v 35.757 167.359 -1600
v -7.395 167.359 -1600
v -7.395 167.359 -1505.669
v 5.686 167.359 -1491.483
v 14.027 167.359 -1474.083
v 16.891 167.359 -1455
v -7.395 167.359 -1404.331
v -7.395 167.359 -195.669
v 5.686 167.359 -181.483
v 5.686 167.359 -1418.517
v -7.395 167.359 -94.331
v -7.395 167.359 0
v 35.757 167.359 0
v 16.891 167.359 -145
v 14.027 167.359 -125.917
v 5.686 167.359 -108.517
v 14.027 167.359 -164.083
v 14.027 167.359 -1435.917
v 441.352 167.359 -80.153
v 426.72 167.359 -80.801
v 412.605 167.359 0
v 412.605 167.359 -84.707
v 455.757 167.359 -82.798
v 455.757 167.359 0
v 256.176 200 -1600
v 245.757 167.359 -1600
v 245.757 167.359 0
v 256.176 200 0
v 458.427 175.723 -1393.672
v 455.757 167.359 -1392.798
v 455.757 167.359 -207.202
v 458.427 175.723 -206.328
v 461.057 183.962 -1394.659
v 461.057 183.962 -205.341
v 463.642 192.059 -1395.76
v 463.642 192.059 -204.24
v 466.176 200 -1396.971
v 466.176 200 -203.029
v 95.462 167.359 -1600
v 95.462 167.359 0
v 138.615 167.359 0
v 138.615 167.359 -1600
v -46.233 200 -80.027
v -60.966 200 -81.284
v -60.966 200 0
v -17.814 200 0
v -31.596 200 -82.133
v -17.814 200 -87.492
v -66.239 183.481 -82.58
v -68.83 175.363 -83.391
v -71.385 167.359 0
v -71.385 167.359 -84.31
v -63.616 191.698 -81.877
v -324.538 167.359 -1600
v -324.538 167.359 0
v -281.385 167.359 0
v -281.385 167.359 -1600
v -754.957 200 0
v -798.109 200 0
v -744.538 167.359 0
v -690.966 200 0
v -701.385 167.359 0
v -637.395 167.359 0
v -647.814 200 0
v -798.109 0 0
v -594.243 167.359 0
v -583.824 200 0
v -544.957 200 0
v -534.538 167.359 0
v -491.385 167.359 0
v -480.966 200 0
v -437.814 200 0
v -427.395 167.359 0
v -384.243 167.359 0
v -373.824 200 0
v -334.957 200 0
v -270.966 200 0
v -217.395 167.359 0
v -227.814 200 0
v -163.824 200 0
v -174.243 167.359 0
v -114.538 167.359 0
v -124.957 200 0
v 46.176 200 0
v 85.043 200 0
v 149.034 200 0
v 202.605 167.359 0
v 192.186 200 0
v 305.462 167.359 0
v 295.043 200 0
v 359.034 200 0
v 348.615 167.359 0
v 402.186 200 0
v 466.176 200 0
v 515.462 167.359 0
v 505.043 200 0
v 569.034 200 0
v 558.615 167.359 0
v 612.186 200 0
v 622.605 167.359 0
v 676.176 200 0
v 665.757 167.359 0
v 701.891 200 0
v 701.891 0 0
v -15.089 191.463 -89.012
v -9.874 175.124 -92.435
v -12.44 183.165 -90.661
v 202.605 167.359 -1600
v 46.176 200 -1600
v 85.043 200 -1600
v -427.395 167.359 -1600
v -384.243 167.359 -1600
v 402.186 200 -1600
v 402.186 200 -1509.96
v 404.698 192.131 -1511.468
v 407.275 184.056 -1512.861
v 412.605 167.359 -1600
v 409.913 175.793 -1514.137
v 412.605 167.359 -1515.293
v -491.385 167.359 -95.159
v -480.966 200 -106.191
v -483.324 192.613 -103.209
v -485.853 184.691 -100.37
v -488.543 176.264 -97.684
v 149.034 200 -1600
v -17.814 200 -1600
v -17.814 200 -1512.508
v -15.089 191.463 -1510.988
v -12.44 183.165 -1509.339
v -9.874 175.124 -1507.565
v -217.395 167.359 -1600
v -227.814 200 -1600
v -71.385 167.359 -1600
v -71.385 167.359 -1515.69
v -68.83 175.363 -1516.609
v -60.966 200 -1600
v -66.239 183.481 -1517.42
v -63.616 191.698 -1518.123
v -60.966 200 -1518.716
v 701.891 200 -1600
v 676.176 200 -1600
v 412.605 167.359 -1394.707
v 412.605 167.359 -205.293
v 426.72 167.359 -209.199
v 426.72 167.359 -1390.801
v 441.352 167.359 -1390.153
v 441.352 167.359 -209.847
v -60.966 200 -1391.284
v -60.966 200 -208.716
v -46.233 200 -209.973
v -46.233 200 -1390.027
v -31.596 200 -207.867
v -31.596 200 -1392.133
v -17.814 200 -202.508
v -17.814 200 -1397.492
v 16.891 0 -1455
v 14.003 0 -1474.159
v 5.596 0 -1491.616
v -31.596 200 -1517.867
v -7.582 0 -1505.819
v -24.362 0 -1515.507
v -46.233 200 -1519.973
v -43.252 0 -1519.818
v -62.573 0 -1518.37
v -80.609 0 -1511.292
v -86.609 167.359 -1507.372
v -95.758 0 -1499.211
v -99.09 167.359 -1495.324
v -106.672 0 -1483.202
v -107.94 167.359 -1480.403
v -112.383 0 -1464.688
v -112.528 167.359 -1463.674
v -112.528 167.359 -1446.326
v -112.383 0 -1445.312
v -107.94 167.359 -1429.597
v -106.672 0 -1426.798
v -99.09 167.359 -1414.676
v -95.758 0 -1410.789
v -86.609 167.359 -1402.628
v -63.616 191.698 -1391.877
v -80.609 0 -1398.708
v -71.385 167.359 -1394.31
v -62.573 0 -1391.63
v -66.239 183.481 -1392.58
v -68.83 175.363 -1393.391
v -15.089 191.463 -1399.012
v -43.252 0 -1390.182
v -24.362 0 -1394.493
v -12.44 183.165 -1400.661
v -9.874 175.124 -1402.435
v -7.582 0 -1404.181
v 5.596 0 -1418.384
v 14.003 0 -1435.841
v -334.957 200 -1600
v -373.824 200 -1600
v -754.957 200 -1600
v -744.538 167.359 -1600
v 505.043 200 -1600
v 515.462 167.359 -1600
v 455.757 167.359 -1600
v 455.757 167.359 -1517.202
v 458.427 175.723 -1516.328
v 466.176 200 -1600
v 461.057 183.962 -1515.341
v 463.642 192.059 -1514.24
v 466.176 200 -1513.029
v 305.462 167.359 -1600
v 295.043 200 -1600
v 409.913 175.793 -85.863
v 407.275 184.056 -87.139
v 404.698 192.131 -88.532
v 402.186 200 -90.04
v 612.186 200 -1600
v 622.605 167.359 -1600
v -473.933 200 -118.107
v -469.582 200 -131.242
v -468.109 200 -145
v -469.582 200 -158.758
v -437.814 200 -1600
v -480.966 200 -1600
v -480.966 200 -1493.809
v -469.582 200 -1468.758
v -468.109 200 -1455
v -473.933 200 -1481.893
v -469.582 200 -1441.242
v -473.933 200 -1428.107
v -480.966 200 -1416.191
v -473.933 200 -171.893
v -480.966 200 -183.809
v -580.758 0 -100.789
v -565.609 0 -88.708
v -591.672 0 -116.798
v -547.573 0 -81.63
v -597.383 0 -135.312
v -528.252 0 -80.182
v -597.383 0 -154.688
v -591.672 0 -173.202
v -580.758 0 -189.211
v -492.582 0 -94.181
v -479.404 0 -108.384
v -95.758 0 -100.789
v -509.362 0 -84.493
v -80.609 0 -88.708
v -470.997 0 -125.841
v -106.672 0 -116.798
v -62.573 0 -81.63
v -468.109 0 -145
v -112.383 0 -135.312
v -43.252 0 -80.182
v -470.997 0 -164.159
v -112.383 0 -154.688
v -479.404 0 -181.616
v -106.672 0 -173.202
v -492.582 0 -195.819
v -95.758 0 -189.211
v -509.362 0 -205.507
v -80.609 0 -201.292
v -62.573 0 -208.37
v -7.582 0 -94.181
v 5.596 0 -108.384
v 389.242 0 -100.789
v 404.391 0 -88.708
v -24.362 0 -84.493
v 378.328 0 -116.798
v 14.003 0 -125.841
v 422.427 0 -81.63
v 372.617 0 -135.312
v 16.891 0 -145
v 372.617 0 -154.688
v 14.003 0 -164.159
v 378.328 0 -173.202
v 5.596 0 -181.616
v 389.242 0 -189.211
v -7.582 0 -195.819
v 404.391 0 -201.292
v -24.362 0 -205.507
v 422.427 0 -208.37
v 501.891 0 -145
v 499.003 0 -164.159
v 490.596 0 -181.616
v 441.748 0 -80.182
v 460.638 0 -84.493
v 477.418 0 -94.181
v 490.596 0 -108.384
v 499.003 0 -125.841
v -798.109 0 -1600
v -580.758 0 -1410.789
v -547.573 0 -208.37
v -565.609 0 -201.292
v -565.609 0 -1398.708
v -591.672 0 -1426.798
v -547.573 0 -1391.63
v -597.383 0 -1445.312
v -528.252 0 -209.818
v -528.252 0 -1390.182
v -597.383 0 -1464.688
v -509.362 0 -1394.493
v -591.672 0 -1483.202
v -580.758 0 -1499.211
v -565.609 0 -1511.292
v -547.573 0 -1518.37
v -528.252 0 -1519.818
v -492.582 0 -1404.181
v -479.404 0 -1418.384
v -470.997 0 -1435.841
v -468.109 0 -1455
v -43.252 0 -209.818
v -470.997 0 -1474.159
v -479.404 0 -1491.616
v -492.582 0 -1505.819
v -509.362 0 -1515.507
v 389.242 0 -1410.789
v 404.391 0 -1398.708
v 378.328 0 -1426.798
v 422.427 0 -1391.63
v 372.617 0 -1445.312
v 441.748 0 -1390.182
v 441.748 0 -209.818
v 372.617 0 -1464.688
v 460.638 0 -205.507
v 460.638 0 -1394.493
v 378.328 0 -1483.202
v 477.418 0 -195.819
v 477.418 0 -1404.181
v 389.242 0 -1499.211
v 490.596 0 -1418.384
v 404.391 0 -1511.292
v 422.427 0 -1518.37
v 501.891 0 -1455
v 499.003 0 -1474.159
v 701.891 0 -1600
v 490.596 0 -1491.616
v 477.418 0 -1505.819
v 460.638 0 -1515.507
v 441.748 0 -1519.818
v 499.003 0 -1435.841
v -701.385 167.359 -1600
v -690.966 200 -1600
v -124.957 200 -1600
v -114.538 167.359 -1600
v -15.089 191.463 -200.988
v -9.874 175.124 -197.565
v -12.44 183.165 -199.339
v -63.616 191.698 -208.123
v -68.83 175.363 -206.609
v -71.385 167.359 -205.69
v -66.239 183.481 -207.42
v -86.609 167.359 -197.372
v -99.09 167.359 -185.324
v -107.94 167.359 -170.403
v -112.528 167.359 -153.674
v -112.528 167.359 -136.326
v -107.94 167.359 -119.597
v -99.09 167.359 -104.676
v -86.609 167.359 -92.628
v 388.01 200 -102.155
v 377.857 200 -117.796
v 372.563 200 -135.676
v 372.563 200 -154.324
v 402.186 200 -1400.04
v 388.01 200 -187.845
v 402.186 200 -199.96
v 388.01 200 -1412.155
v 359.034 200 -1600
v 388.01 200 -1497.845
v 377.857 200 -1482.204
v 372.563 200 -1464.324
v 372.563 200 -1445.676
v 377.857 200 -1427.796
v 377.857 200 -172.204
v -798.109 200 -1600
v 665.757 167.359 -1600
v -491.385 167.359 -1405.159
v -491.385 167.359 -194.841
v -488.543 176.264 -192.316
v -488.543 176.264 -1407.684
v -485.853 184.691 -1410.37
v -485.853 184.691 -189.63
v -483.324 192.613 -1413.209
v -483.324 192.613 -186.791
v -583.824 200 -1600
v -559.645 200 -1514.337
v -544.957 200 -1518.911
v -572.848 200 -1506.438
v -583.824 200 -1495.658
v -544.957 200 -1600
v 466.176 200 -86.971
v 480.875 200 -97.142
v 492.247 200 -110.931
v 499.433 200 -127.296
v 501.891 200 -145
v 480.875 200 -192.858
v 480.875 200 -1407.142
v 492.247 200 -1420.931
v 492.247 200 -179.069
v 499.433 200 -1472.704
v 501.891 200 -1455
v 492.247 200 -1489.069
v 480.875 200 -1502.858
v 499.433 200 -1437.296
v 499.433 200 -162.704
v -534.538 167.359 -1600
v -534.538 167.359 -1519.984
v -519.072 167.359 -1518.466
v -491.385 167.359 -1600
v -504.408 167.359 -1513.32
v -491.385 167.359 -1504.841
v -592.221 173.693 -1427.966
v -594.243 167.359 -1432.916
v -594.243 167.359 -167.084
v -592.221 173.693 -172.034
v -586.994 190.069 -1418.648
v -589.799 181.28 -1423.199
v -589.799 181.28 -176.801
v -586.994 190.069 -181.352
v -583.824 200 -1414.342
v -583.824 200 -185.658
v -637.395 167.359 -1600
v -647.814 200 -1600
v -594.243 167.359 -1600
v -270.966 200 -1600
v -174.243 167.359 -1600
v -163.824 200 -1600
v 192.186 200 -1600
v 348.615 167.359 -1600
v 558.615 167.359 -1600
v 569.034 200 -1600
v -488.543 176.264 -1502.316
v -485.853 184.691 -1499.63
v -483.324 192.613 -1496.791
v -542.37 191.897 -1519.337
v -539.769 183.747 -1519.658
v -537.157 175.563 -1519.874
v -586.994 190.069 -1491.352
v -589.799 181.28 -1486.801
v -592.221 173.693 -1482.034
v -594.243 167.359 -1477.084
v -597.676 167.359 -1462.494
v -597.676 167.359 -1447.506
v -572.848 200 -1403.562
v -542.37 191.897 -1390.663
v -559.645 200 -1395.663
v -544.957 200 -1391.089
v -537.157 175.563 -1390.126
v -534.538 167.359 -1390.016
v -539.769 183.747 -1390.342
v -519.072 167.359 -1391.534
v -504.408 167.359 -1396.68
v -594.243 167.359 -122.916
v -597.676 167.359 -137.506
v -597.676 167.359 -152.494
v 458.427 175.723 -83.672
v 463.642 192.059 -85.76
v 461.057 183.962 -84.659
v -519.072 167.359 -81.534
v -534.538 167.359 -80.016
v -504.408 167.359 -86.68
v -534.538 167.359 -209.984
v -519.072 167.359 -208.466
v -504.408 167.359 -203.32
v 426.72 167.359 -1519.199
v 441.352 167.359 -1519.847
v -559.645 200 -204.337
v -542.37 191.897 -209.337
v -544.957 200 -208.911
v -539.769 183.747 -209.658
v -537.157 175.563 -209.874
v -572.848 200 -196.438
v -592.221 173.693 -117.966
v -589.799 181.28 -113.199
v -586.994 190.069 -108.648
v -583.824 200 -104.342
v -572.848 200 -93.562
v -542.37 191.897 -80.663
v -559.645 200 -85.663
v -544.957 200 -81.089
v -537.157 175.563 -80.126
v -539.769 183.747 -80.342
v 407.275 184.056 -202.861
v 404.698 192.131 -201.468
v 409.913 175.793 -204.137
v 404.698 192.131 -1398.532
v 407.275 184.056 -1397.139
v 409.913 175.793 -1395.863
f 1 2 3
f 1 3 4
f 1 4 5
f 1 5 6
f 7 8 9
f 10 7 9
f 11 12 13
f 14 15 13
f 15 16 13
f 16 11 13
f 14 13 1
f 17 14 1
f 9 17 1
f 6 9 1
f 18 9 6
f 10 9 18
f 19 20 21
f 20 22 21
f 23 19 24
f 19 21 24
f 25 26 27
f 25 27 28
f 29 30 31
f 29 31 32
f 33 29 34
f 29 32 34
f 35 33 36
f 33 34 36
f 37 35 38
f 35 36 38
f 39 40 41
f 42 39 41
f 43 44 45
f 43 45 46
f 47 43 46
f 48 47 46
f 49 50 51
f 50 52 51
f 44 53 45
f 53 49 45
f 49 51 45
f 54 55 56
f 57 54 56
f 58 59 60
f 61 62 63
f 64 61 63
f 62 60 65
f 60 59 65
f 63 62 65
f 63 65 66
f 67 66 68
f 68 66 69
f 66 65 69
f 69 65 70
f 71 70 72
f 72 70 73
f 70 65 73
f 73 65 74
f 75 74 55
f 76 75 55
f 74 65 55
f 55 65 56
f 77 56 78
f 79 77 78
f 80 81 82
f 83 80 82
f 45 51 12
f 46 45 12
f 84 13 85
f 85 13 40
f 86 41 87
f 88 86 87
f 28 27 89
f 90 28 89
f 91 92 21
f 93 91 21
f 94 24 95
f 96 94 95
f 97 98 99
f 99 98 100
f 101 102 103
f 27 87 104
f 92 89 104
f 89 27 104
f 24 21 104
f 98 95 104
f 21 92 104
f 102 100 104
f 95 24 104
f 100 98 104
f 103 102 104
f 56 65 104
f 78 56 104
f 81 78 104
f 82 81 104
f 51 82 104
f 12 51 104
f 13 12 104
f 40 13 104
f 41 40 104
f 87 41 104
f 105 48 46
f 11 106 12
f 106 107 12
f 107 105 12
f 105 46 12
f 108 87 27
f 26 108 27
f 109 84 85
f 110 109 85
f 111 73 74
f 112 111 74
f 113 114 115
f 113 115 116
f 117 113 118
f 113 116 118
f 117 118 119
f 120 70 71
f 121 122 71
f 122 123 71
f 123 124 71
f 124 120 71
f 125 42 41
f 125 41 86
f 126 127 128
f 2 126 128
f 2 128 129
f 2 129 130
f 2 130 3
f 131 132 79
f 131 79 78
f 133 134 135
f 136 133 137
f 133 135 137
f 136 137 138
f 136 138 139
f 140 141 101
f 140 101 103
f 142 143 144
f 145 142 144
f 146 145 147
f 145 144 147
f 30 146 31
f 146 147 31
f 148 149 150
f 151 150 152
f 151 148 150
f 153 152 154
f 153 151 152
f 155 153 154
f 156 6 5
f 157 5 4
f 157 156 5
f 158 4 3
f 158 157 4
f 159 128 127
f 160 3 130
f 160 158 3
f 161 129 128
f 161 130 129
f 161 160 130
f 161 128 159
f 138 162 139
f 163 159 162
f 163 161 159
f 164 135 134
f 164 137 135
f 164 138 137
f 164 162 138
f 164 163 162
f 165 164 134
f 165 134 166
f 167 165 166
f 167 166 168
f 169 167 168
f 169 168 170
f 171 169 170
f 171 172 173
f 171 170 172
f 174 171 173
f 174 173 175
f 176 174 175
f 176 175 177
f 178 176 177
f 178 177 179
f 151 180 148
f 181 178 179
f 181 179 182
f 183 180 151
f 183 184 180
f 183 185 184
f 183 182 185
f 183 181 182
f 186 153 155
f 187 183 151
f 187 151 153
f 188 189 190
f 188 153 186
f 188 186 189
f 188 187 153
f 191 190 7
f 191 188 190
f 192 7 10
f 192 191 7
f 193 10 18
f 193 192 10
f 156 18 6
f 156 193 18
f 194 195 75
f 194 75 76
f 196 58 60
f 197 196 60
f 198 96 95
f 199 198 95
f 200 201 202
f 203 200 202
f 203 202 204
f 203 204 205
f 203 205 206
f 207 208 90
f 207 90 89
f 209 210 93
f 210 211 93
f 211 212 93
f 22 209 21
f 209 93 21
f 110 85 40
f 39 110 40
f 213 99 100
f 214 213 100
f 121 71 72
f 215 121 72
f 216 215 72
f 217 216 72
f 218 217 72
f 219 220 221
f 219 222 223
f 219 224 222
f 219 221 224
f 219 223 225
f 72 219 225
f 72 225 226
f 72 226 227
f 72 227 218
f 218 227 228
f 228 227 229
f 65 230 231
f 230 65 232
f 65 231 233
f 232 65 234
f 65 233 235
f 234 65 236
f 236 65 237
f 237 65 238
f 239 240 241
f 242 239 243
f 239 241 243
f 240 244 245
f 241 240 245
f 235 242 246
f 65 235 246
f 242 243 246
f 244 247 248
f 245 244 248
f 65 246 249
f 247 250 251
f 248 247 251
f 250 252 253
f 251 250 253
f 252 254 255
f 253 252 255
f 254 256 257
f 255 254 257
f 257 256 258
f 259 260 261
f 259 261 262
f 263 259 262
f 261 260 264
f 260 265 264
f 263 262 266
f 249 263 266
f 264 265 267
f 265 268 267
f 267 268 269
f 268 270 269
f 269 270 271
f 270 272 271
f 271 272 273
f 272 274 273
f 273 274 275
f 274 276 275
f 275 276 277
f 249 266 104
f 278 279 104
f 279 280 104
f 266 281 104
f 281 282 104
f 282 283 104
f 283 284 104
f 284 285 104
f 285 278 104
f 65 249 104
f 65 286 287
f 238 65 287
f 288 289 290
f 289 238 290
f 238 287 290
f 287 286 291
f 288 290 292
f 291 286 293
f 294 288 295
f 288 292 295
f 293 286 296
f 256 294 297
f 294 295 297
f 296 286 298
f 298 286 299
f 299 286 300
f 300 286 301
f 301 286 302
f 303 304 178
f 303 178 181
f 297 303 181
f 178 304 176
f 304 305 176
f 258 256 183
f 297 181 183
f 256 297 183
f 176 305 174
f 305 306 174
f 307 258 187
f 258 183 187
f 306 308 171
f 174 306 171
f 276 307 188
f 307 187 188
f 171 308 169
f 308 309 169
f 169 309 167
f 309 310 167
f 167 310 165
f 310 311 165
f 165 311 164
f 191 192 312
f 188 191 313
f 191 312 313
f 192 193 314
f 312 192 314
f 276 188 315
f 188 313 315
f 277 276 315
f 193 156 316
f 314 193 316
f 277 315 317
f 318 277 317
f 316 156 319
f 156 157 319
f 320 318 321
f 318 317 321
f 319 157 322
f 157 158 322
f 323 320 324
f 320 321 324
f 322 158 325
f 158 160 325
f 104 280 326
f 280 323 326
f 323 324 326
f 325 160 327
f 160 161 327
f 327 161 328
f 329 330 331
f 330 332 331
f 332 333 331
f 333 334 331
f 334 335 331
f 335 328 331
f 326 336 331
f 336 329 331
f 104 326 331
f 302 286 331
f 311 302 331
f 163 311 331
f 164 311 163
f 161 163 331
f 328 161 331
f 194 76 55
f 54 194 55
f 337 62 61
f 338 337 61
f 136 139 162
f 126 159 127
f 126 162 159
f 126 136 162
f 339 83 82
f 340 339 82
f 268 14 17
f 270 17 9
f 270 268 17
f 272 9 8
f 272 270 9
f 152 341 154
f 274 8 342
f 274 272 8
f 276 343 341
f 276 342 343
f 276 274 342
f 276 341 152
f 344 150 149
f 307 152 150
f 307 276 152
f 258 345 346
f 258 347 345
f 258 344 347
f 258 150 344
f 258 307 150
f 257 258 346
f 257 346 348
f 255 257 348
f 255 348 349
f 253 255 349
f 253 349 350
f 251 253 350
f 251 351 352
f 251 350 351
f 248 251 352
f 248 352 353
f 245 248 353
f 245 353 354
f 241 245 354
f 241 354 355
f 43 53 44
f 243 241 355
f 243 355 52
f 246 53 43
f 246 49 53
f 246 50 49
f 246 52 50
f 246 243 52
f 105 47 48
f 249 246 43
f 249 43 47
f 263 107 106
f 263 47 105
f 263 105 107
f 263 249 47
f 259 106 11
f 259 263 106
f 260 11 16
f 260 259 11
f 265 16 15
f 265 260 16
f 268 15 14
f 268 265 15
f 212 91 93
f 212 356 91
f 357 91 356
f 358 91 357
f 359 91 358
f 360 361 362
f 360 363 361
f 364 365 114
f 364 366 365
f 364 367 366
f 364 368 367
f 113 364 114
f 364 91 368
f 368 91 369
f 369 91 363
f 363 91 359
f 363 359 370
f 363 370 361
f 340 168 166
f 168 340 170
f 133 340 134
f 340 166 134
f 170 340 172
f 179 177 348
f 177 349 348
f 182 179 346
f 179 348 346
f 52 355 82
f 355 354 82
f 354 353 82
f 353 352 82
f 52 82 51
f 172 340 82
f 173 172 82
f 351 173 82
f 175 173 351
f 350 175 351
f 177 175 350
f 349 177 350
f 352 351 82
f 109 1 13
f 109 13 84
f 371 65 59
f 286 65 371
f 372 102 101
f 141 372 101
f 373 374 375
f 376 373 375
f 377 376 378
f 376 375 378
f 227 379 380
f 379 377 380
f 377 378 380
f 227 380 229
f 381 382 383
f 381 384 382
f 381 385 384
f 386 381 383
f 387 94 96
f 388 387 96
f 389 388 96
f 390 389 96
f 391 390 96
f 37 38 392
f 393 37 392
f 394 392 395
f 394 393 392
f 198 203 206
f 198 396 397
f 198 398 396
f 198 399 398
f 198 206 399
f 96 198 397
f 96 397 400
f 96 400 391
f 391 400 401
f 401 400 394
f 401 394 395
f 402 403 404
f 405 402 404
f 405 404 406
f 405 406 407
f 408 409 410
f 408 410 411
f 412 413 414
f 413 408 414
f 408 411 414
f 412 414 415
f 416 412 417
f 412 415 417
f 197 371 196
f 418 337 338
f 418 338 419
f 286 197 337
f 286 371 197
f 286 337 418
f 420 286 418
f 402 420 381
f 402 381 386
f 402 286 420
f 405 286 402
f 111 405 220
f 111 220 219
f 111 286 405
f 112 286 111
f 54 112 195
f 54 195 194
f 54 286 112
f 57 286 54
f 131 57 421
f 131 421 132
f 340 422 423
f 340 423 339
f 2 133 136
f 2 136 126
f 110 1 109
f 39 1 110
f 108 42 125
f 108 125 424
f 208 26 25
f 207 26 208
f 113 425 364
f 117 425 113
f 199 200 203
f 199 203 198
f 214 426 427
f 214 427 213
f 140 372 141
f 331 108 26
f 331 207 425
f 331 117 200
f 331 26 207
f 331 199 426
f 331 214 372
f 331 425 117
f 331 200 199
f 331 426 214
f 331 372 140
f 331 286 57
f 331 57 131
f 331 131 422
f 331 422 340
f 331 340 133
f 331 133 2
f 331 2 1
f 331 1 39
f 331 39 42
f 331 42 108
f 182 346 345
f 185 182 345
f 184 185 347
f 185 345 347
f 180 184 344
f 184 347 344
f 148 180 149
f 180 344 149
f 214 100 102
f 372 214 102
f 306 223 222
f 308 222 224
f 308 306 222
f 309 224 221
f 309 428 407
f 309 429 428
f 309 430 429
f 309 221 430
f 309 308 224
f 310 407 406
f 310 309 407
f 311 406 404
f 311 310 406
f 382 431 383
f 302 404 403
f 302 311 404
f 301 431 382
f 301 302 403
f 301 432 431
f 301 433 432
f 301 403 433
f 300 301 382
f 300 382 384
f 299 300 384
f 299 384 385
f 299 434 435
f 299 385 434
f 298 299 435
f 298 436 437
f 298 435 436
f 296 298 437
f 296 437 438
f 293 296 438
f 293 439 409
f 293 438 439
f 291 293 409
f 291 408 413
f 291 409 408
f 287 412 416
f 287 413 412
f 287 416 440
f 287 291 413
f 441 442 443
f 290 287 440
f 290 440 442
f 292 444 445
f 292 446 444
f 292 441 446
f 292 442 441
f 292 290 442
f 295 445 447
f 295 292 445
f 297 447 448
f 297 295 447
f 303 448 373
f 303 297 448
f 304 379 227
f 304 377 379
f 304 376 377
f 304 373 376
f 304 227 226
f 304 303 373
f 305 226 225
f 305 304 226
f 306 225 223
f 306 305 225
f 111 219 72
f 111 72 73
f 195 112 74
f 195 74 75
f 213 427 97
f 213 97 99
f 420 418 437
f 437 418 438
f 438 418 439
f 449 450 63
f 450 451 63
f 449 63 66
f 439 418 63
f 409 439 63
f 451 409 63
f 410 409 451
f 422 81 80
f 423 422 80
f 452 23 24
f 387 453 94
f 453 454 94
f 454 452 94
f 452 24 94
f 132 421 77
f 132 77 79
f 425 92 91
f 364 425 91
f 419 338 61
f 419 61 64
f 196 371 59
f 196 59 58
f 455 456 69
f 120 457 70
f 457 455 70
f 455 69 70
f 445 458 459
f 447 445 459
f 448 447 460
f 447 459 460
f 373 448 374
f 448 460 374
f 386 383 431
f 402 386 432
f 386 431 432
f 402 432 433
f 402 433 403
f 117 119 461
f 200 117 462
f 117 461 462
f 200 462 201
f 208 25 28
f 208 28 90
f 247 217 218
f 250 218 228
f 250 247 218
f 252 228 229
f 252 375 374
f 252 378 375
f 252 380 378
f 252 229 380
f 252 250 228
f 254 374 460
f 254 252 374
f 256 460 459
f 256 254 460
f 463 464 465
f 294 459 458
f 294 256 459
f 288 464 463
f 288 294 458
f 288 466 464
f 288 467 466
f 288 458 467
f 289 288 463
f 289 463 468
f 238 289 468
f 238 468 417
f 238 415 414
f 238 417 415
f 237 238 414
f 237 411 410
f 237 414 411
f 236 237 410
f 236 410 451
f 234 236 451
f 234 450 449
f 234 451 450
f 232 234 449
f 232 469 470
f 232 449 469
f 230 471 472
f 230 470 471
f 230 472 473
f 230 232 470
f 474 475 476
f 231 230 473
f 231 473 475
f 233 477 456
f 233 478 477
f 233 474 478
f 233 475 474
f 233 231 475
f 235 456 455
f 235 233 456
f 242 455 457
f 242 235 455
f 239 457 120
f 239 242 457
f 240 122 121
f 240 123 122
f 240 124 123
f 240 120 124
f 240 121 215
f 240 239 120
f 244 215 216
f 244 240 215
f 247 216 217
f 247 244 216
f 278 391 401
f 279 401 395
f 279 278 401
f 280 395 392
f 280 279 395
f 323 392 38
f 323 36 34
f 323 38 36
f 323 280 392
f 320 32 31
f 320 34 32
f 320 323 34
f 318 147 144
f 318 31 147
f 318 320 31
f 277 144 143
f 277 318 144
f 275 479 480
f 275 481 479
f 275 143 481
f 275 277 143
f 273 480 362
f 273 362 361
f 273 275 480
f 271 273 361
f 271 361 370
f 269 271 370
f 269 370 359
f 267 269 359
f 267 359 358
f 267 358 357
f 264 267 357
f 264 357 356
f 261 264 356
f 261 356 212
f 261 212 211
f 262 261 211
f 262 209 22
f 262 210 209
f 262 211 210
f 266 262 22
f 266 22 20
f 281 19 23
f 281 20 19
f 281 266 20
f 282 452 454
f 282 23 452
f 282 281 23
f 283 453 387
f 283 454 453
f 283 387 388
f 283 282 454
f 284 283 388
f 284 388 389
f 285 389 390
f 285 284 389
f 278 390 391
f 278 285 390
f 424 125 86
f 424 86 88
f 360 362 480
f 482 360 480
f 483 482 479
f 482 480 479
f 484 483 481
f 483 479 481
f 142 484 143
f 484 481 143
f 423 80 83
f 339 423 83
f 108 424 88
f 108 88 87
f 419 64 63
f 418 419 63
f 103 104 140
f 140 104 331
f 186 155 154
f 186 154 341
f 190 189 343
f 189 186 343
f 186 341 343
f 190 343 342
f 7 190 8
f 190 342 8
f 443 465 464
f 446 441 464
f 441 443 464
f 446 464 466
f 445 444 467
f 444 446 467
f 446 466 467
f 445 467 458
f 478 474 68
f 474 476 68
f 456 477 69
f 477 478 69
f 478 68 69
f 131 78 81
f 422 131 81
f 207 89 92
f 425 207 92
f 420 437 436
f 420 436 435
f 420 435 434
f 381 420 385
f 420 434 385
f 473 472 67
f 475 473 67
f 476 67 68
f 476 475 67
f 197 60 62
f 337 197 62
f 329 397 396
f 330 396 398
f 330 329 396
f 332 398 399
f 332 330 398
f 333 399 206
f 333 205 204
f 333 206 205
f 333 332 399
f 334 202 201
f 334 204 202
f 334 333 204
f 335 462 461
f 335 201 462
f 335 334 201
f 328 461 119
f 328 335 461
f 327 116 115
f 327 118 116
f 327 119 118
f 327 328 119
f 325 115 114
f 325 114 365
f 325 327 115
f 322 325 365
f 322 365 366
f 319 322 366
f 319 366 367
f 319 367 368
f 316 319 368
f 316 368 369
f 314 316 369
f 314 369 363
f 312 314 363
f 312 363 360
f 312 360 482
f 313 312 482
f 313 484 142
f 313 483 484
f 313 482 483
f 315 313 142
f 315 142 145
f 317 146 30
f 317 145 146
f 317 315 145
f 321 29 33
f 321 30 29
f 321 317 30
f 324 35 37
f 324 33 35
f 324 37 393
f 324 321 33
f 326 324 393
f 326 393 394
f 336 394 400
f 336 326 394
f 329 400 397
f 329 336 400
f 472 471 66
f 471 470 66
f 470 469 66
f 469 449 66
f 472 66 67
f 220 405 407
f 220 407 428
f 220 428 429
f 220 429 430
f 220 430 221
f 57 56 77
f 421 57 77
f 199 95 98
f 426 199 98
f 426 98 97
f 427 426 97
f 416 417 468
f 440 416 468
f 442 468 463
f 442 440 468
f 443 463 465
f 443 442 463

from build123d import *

# Parameters (mm, degrees)
SKETCH1_W               = 1500
SKETCH1_H               = 1600
SKETCH1_R               = 65
BOSS_EXTRUDE1_DEPTH     = 200
CUT_EXTRUDE1_DEPTH      = 1
CUT_EXTRUDE1_DEPTH_BACK = 1601


with BuildPart() as part:
    # Sketch1 → Boss-Extrude1 (new body)
    with BuildSketch(Plane(origin=(0, 0, 0), x_dir=(1, 0, 0), z_dir=(0, 1, 0))):
        with Locations((-48.109243697, 800)):
            Rectangle(SKETCH1_W, SKETCH1_H)
        with Locations((436.890756303, 1455)):
            Circle(SKETCH1_R, mode=Mode.SUBTRACT)
        with Locations((-48.109243697, 1455)):
            Circle(SKETCH1_R, mode=Mode.SUBTRACT)
        with Locations((-533.109243697, 1455)):
            Circle(SKETCH1_R, mode=Mode.SUBTRACT)
        with Locations((436.890756303, 145)):
            Circle(SKETCH1_R, mode=Mode.SUBTRACT)
        with Locations((-48.109243697, 145)):
            Circle(SKETCH1_R, mode=Mode.SUBTRACT)
        with Locations((-533.109243697, 145)):
            Circle(SKETCH1_R, mode=Mode.SUBTRACT)
    extrude(amount=BOSS_EXTRUDE1_DEPTH)

    # Sketch3 → Cut-Extrude1 (cut, two sides)
    with BuildSketch(Plane.XY) as cut_extrude1_sk:
        Polygon((-690.966386555, 200), (-754.956850499, 200), (-744.537815126, 167.358848998), (-701.385421928, 167.358848998), align=None)
        Polygon((676.176470588, 200), (612.186006644, 200), (622.605042017, 167.358848998), (665.757435215, 167.358848998), align=None)
        Polygon((569.033613445, 200), (505.043149501, 200), (515.462184874, 167.358848998), (558.614578072, 167.358848998), align=None)
        Polygon((466.176470588, 200), (402.186006644, 200), (412.605042017, 167.358848998), (455.757435215, 167.358848998), align=None)
        Polygon((359.033613445, 200), (295.043149501, 200), (305.462184874, 167.358848998), (348.614578072, 167.358848998), align=None)
        Polygon((256.176470588, 200), (192.186006644, 200), (202.605042017, 167.358848998), (245.757435215, 167.358848998), align=None)
        Polygon((149.033613445, 200), (85.043149501, 200), (95.462184874, 167.358848998), (138.614578072, 167.358848998), align=None)
        Polygon((46.176470588, 200), (-17.813993356, 200), (-7.394957983, 167.358848998), (35.757435215, 167.358848998), align=None)
        Polygon((-60.966386555, 200), (-124.956850499, 200), (-114.537815126, 167.358848998), (-71.385421928, 167.358848998), align=None)
        Polygon((-163.823529412, 200), (-227.813993356, 200), (-217.394957983, 167.358848998), (-174.242564785, 167.358848998), align=None)
        Polygon((-270.966386555, 200), (-334.956850499, 200), (-324.537815126, 167.358848998), (-281.385421928, 167.358848998), align=None)
        Polygon((-373.823529412, 200), (-437.813993356, 200), (-427.394957983, 167.358848998), (-384.242564785, 167.358848998), align=None)
        Polygon((-480.966386555, 200), (-544.956850499, 200), (-534.537815126, 167.358848998), (-491.385421928, 167.358848998), align=None)
        Polygon((-583.823529412, 200), (-647.813993356, 200), (-637.394957983, 167.358848998), (-594.242564785, 167.358848998), align=None)
    extrude(amount=CUT_EXTRUDE1_DEPTH, mode=Mode.SUBTRACT)
    extrude(cut_extrude1_sk.sketch, amount=-CUT_EXTRUDE1_DEPTH_BACK, mode=Mode.SUBTRACT)


solid = part.part
